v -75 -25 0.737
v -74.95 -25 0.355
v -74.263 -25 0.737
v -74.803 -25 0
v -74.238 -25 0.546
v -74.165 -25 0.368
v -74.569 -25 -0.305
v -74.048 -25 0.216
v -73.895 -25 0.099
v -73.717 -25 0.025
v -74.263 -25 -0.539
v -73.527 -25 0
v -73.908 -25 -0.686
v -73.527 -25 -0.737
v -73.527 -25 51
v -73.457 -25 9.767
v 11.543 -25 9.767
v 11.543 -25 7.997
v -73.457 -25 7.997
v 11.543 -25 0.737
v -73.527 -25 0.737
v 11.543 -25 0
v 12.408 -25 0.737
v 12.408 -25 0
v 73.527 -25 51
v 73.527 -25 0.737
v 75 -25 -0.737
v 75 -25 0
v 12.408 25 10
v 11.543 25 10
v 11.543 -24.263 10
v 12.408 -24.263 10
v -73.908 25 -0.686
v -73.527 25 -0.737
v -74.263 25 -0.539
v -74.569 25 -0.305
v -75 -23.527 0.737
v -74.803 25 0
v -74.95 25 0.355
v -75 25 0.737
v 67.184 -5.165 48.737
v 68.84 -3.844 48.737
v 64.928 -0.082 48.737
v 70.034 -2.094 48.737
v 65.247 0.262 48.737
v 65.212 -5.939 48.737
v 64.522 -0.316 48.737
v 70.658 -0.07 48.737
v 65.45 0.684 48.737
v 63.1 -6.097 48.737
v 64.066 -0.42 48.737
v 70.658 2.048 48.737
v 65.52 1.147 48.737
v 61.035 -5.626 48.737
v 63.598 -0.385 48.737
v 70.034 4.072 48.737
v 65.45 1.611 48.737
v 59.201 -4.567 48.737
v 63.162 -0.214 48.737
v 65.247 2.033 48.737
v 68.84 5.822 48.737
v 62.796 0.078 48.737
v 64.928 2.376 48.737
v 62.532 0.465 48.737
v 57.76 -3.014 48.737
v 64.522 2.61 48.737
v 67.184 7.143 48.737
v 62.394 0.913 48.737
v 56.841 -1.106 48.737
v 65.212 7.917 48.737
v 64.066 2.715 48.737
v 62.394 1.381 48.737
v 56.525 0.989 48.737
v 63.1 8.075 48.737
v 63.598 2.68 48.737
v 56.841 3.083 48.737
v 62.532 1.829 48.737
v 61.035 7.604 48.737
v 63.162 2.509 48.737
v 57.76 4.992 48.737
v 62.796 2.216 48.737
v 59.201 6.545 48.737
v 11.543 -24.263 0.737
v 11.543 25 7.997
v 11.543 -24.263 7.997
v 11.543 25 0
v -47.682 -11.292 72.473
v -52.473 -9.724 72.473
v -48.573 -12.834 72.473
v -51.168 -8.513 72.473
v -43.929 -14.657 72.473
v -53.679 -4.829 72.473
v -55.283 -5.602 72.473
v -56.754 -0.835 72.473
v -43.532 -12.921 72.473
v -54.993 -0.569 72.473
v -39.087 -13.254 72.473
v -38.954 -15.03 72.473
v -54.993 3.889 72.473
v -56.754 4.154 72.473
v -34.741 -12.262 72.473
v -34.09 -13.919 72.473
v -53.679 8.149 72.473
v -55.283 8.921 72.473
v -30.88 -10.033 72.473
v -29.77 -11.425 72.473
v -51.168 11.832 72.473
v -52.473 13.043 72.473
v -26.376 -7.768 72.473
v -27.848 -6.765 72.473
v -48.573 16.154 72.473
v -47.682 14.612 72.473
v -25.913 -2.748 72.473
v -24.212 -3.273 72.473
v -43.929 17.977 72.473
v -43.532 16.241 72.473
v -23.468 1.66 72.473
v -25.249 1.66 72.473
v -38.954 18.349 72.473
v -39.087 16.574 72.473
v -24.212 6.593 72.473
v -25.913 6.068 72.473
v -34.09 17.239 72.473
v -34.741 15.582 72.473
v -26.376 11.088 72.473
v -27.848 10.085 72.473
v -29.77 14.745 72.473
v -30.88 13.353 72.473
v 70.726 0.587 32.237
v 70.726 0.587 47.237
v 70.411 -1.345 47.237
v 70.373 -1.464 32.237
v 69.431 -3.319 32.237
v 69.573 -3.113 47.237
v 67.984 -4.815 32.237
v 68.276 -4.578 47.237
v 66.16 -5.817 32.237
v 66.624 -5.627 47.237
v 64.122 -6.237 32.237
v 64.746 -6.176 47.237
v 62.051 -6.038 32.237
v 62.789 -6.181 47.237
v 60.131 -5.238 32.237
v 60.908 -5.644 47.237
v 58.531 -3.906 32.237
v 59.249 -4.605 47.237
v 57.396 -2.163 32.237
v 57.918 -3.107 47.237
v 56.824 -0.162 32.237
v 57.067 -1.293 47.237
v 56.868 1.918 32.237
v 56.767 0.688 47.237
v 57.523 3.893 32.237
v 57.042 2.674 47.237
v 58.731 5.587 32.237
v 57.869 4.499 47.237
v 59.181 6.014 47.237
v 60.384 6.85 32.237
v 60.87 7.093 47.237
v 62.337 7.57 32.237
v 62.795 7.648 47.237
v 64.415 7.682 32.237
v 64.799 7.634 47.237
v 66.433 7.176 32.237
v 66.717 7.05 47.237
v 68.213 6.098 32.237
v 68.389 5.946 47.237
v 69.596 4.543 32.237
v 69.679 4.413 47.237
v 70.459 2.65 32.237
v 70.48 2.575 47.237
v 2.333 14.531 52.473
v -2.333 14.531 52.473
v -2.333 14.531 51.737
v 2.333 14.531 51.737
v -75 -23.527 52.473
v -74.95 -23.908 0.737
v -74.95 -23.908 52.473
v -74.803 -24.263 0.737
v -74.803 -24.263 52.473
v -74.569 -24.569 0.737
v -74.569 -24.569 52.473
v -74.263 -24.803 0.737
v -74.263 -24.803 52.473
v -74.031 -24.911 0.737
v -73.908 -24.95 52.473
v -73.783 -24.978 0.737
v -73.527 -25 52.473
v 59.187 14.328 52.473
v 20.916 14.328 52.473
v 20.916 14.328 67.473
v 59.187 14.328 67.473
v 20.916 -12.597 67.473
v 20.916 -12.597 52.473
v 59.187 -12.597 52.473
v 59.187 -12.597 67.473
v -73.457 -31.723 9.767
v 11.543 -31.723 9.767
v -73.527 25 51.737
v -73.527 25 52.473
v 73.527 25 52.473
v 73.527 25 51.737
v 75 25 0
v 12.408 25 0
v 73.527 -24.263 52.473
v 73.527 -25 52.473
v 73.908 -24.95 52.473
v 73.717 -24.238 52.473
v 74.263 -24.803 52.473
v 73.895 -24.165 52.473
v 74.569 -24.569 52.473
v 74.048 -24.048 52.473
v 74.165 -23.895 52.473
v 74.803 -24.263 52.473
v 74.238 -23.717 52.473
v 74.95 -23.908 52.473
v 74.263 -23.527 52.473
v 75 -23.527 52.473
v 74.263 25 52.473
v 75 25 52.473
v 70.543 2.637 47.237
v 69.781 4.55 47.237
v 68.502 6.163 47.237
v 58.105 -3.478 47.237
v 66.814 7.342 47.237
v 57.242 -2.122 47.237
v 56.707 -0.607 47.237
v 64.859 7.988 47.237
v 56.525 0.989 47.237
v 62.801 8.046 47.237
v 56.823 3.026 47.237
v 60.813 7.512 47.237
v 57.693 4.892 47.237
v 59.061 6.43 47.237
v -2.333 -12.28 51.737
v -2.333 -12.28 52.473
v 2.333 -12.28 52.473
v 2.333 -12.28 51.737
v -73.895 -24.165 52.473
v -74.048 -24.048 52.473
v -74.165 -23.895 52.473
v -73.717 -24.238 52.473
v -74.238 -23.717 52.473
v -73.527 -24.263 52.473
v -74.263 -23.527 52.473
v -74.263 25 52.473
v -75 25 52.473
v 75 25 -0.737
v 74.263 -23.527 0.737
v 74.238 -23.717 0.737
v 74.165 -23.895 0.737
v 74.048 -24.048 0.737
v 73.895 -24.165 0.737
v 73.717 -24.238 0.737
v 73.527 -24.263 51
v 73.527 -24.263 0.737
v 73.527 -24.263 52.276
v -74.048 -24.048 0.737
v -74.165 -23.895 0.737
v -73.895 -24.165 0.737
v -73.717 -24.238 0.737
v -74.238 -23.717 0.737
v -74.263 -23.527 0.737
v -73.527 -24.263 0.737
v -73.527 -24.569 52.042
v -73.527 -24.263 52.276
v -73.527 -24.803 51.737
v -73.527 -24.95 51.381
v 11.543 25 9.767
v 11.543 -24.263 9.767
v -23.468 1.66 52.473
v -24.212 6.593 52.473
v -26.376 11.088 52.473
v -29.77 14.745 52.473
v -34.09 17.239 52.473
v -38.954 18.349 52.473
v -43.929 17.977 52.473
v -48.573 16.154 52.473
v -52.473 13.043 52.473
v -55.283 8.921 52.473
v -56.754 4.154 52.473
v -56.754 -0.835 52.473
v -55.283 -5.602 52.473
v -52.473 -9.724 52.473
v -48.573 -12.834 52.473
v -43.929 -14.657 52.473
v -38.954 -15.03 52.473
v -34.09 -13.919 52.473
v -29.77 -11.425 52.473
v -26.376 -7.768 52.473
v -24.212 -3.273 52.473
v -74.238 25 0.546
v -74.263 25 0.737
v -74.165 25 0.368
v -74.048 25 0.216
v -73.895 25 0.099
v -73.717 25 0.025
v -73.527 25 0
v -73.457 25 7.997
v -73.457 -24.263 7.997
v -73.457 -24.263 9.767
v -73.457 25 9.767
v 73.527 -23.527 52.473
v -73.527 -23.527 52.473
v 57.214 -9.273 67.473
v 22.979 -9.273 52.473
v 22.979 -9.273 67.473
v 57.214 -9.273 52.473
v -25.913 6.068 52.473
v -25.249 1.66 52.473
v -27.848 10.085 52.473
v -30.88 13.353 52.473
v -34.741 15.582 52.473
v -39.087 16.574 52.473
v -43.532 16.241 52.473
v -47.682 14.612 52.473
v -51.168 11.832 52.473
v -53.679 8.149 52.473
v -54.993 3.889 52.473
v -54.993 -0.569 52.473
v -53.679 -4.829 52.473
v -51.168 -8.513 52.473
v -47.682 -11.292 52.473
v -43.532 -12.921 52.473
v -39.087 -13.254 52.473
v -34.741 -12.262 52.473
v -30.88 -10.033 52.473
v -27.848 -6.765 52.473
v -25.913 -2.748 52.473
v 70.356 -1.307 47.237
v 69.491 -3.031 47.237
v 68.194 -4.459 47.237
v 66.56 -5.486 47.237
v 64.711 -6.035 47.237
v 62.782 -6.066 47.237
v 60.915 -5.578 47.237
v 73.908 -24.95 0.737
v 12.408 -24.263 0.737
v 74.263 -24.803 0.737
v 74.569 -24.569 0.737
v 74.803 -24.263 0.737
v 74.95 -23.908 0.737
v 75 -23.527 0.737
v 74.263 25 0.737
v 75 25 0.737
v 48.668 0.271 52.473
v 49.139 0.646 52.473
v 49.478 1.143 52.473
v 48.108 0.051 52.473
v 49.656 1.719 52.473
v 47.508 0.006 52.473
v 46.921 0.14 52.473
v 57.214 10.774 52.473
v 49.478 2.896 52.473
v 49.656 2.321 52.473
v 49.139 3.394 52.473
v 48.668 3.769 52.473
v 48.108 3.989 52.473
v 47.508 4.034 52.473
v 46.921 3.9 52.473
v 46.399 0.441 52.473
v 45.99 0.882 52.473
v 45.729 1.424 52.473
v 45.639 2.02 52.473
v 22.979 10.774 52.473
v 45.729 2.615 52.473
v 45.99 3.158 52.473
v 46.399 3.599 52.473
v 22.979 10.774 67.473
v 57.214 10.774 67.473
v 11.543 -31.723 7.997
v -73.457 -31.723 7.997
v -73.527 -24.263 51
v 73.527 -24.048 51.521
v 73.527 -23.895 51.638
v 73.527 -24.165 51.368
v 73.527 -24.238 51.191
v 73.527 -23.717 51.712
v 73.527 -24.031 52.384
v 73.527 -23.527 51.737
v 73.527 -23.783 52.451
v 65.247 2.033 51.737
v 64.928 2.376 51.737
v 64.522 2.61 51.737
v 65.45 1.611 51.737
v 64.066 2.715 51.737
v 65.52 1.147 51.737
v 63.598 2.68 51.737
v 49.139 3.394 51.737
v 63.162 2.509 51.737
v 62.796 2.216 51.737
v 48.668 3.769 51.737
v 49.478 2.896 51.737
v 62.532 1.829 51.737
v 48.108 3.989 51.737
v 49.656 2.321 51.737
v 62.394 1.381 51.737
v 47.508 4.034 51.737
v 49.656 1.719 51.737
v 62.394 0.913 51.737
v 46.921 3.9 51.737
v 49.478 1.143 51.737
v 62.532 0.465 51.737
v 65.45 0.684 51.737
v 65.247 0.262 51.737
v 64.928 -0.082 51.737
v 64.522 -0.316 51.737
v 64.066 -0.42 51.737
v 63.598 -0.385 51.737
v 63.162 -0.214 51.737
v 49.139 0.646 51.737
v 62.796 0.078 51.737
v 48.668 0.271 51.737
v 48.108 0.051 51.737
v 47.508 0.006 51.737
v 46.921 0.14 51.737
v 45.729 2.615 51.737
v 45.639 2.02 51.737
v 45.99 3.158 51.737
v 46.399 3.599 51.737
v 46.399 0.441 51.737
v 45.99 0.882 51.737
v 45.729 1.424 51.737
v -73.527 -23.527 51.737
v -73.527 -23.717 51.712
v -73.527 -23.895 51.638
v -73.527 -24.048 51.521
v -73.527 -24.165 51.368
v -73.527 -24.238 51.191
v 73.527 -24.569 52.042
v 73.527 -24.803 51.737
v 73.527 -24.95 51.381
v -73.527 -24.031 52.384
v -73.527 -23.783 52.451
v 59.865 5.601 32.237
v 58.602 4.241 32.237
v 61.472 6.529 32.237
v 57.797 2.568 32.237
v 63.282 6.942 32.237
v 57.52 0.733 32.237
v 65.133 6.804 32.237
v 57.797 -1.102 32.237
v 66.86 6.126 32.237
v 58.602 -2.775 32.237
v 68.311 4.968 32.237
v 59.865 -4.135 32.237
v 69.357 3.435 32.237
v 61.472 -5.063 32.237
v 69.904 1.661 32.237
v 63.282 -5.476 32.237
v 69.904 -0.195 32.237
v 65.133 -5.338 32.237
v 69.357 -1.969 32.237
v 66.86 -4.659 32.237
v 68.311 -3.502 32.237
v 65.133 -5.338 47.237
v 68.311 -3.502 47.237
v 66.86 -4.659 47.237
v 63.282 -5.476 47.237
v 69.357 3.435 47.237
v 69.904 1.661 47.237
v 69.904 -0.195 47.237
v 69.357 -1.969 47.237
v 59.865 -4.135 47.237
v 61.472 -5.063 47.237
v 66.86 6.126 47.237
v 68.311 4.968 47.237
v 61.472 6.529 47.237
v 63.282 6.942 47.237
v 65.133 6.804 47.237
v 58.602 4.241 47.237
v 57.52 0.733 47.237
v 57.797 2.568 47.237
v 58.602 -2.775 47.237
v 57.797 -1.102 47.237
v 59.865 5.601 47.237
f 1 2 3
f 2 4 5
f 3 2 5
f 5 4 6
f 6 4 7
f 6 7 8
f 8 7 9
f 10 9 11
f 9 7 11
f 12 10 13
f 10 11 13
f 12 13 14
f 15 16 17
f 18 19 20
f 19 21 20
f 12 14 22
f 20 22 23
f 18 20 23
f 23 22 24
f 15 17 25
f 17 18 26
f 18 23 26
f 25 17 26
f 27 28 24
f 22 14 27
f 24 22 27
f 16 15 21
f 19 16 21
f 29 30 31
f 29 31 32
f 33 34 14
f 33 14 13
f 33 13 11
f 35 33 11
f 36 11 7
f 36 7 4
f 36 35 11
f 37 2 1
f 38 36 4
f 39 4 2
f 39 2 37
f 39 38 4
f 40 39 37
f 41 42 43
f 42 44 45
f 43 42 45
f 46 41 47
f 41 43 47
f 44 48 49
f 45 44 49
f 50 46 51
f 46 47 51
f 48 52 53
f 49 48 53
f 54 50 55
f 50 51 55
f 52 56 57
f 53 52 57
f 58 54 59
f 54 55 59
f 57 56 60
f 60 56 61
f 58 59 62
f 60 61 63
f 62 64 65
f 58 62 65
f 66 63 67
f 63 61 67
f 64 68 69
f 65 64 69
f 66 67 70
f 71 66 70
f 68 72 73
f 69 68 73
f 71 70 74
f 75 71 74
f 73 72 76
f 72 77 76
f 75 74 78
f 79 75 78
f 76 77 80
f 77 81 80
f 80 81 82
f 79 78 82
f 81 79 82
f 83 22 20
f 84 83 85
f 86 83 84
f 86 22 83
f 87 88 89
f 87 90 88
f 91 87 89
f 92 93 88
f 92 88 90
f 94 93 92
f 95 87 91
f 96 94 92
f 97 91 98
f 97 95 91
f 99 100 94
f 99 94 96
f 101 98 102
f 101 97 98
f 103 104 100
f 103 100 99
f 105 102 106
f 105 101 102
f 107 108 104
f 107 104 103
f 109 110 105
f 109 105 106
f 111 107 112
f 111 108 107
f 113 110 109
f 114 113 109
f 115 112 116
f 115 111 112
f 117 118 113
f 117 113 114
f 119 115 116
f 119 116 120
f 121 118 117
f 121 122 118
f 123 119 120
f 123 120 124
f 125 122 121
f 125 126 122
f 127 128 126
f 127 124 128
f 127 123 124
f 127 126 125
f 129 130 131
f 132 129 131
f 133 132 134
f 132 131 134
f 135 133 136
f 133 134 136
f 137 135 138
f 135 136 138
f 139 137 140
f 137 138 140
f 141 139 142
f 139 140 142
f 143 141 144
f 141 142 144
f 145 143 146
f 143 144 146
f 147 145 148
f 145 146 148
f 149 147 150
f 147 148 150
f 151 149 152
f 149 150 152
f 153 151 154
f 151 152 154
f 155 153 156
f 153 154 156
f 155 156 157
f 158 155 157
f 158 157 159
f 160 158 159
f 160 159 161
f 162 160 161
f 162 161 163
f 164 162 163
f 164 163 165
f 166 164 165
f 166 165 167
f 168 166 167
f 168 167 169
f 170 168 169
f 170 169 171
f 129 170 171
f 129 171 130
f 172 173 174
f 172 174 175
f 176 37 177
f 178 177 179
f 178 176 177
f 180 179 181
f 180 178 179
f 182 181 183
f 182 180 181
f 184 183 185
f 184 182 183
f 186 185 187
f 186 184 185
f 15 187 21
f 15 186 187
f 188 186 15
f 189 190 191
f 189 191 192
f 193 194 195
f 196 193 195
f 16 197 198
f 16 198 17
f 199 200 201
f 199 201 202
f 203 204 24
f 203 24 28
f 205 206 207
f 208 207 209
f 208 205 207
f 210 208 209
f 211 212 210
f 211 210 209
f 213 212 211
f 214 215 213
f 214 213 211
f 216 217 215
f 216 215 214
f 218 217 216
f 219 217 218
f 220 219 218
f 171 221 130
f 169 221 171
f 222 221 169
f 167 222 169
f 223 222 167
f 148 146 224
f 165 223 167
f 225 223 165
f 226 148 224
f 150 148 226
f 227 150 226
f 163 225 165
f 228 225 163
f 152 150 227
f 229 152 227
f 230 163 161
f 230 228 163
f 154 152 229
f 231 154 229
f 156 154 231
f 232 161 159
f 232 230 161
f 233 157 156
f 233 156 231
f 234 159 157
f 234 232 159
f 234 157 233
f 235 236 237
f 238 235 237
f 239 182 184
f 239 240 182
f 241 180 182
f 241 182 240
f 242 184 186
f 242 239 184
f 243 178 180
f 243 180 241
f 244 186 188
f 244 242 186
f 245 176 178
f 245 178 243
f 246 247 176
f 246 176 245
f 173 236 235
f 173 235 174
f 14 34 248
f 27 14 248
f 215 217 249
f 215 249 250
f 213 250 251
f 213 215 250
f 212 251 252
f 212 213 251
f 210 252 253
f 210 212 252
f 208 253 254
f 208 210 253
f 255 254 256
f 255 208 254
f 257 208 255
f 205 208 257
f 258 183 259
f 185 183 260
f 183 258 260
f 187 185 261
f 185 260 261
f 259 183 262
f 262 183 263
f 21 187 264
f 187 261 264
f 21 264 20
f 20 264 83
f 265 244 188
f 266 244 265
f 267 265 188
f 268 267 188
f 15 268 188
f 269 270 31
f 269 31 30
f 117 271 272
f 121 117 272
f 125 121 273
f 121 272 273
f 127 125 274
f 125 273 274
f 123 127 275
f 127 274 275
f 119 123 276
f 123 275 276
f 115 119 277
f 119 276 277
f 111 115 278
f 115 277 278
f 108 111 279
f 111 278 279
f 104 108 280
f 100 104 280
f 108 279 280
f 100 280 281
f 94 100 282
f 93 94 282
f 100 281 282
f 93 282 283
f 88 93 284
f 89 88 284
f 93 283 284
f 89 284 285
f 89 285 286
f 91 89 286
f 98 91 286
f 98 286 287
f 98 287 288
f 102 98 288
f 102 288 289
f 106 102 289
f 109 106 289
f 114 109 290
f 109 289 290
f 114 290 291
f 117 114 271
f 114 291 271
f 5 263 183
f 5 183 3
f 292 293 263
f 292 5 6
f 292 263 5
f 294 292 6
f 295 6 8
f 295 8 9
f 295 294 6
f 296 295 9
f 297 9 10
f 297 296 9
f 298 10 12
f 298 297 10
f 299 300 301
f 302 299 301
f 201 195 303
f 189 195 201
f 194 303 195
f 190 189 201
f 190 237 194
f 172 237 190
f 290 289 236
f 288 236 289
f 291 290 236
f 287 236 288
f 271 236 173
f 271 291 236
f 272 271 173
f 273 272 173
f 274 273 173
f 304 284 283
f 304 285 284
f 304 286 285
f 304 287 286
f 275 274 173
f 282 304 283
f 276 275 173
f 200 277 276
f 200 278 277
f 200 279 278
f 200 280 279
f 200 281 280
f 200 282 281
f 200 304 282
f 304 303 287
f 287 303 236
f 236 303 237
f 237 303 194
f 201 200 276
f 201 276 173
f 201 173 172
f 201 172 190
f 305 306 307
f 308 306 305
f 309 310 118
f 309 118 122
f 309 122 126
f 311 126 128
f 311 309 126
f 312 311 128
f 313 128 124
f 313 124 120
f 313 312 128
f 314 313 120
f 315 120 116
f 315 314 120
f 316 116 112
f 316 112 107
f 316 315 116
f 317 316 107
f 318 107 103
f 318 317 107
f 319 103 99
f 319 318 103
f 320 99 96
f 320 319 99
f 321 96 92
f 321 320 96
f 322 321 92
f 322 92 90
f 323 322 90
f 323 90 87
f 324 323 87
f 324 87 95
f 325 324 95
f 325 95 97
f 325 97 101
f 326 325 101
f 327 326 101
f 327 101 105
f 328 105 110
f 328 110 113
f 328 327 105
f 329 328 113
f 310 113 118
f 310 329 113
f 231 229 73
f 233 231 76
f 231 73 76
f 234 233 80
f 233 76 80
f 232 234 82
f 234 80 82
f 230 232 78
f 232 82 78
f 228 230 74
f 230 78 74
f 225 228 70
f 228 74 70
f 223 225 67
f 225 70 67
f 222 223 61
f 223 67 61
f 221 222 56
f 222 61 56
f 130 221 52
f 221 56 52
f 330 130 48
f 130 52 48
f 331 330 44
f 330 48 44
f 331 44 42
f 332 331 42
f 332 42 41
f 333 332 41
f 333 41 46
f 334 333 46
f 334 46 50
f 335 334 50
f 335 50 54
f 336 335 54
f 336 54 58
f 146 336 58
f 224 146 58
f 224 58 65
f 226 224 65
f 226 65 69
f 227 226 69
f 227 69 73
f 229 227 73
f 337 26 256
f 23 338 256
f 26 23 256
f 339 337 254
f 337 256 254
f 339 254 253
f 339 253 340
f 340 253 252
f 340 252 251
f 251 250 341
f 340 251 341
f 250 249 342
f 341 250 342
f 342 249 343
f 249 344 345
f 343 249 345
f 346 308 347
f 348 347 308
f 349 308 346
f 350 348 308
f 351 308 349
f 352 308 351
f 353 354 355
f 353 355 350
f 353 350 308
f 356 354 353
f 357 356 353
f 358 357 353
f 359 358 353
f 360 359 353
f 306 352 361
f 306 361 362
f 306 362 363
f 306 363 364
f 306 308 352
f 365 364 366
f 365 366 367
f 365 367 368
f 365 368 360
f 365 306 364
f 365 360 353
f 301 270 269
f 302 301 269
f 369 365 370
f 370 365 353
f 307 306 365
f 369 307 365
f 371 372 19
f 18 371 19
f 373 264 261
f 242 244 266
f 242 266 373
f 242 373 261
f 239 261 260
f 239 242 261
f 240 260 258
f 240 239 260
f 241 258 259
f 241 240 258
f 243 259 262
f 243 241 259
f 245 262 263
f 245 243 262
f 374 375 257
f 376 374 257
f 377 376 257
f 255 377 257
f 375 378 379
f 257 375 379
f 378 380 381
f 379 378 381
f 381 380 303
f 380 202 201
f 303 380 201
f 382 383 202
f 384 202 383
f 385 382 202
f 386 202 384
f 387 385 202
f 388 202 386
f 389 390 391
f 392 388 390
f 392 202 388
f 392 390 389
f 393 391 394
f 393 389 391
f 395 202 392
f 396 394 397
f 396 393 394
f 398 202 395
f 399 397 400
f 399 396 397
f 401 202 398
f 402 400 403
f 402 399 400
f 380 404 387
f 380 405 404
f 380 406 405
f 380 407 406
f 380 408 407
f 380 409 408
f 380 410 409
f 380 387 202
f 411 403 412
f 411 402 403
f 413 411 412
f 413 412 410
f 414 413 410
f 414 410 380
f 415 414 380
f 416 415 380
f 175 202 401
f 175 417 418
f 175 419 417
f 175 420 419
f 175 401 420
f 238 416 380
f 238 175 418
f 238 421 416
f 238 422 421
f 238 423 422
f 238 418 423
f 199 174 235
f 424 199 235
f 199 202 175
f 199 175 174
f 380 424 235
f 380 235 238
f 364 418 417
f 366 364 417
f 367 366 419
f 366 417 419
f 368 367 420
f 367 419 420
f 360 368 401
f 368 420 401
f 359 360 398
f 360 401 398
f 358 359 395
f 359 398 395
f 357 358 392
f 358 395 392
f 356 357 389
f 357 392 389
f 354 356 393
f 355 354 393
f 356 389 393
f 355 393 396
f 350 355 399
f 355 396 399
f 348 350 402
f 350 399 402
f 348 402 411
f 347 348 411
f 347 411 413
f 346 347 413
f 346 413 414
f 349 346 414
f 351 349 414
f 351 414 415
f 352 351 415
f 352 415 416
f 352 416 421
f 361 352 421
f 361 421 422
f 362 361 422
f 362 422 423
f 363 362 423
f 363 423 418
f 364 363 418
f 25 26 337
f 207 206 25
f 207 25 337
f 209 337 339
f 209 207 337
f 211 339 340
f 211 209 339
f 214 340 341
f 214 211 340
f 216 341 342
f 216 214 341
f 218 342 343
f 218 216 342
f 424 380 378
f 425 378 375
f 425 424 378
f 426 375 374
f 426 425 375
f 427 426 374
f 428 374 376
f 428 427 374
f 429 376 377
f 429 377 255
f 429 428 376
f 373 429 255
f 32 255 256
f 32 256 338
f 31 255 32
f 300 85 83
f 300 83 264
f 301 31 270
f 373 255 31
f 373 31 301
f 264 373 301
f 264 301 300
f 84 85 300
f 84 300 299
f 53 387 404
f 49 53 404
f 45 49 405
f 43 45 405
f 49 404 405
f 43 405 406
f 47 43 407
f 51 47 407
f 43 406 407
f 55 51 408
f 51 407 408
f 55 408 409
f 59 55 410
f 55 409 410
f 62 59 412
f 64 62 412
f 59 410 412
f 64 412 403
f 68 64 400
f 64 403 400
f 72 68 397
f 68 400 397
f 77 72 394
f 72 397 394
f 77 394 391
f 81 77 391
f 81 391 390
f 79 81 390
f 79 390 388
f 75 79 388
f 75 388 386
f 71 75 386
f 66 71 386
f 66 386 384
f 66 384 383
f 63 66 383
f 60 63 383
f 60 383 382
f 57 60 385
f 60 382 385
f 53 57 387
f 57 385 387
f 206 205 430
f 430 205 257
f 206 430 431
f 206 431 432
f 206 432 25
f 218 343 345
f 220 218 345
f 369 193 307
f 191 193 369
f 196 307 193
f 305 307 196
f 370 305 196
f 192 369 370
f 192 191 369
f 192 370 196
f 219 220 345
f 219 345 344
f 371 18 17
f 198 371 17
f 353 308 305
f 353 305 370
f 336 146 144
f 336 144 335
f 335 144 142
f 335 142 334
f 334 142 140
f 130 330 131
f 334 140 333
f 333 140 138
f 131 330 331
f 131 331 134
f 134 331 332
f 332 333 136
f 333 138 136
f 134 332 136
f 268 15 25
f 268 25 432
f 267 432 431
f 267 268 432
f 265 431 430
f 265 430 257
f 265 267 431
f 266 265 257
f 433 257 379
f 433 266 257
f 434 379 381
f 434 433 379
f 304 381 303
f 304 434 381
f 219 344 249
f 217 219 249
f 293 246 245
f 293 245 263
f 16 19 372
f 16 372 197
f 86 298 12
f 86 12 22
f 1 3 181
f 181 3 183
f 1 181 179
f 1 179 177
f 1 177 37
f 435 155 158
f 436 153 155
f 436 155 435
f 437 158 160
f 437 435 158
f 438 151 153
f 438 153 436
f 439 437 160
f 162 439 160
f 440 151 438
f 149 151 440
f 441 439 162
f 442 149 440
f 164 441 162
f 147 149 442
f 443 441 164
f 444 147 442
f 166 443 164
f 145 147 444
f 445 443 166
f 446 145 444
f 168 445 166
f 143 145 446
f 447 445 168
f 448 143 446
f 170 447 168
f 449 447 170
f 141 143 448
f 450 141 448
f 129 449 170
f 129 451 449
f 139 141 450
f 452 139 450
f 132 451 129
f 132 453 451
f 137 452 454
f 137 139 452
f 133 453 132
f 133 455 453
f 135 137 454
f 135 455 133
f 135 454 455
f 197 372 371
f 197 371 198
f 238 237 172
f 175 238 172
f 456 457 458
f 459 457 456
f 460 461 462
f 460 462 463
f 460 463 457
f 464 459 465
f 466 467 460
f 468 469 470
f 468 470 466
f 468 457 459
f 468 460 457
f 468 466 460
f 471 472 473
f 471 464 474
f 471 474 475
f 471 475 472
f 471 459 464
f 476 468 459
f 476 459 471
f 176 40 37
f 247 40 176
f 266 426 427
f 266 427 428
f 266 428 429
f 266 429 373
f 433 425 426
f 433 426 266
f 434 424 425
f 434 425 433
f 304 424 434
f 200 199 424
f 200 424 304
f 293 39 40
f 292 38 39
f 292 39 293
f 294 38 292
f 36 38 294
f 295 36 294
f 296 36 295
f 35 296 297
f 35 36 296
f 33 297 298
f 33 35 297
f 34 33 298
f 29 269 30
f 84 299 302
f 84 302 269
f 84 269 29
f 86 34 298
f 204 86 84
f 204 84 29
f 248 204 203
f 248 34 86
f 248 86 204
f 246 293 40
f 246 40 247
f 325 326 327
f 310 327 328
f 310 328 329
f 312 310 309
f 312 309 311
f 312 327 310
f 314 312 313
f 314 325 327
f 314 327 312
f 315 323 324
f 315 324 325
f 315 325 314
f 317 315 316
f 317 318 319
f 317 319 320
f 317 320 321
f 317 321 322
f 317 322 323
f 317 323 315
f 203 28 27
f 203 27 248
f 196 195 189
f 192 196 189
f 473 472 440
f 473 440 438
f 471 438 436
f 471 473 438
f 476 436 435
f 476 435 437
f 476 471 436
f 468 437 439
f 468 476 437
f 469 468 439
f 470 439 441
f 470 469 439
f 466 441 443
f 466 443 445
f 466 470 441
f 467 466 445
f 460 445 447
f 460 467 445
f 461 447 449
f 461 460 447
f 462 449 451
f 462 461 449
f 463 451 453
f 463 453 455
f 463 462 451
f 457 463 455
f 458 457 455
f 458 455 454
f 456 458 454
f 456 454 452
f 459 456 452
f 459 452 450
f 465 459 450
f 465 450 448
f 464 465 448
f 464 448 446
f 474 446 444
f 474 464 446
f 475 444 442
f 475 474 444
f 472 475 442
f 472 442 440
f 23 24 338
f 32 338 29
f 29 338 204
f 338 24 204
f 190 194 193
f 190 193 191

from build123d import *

# Parameters (mm, degrees)
SKETCH1_W                    = 150
SKETCH1_H                    = 50
BASE_FLANGE1_DEPTH           = 0.7366
EDGE_FLANGE2_STRIP_W         = 4.4196
EDGE_FLANGE2_STRIP_H         = 0.7366
EDGE_FLANGE2_STRIP_CUT_DEPTH = 50
EDGE_FLANGE2_DEPTH           = 50
EDGE_FLANGE3_STRIP_W         = 4.4196
EDGE_FLANGE3_STRIP_H         = 0.7366
EDGE_FLANGE3_STRIP_CUT_DEPTH = 51.7366
EDGE_FLANGE3_DEPTH           = 51.7366
EDGE_FLANGE5_STRIP_W         = 4.4196
EDGE_FLANGE5_STRIP_H         = 0.7366
EDGE_FLANGE5_STRIP_CUT_DEPTH = 51.7366
EDGE_FLANGE5_DEPTH           = 51.7366
EDGE_FLANGE6_STRIP_W         = 4.4196
EDGE_FLANGE6_STRIP_H         = 0.7366
EDGE_FLANGE6_STRIP_CUT_DEPTH = 147.0536
EDGE_FLANGE6_DEPTH           = 147.0536
SKETCH38_W                   = 4.66509895
SKETCH38_H                   = 26.811141958
CUT_EXTRUDE1_DEPTH           = 2
SKETCH40_R                   = 16.736303479
SKETCH40_R_2                 = 14.955594907
BOSS_EXTRUDE4_DEPTH          = 20
SKETCH42_W                   = 0.865074657
SKETCH42_H                   = 50
BOSS_EXTRUDE5_DEPTH          = 10
SKETCH57_W                   = 1.770321067
SKETCH57_H                   = 56.722896859
BOSS_EXTRUDE7_DEPTH          = 85
SKETCH60_W                   = 38.271407539
SKETCH60_H                   = 26.924897386
SKETCH60_W_2                 = 34.235775553
SKETCH60_H_2                 = 20.047107357
BOSS_EXTRUDE8_DEPTH          = 15
SKETCH61_R                   = 2.019782533
CUT_EXTRUDE3_DEPTH           = 2
SKETCH62_R                   = 1.571954748
BOSS_EXTRUDE9_DEPTH          = 3
SKETCH63_R                   = 7.10603058
BOSS_EXTRUDE10_DEPTH         = 1.5
SKETCH64_R                   = 6.980489156
SKETCH64_R_2                 = 6.226740222
BOSS_EXTRUDE11_DEPTH         = 15


# Sheet-metal steps are written as plain solids
with BuildPart() as part:
    # Sketch1 → Base-Flange1 (new body)
    with BuildSketch(Plane.XY):
        Rectangle(SKETCH1_W, SKETCH1_H)
    extrude(amount=-BASE_FLANGE1_DEPTH)

    # Edge-Flange2 strip (across the edge) → Edge-Flange2 strip cut (cut)
    with BuildSketch(Plane(origin=(-75, 25, 0), x_dir=(1, 0, 0), z_dir=(0, -1, 0))):
        with Locations((-0.7366, -0.3683)):
            Rectangle(EDGE_FLANGE2_STRIP_W, EDGE_FLANGE2_STRIP_H)
    extrude(amount=EDGE_FLANGE2_STRIP_CUT_DEPTH, mode=Mode.SUBTRACT)

    # Edge-Flange2 section (across the edge) → Edge-Flange2 (add)
    with BuildSketch(Plane(origin=(-75, 25, 0), x_dir=(1, 0, 0), z_dir=(0, -1, 0))):
        with BuildLine():
            Line((0, 0.7366), (0, 52.4732))
            Line((0, 52.4732), (0.7366, 52.4732))
            Line((0.7366, 52.4732), (0.7366, 0.7366))
            ThreePointArc((0.7366, 0.7366), (0.952345145, 0.215745145), (1.4732, 0))
            Line((1.4732, 0), (1.4732, -0.7366))
            ThreePointArc((1.4732, -0.7366), (0.43149029, -0.30510971), (0, 0.7366))
        make_face()
    extrude(amount=EDGE_FLANGE2_DEPTH)

    # Edge-Flange3 strip (across the edge) → Edge-Flange3 strip cut (cut)
    with BuildSketch(Plane(origin=(-74.2634, -25, 52.4732), x_dir=(0, 1, 0), z_dir=(0, 0, -1))):
        with Locations((-0.7366, -0.3683)):
            Rectangle(EDGE_FLANGE3_STRIP_W, EDGE_FLANGE3_STRIP_H)
    extrude(amount=EDGE_FLANGE3_STRIP_CUT_DEPTH, mode=Mode.SUBTRACT)

    # Edge-Flange3 section (across the edge) → Edge-Flange3 (add)
    with BuildSketch(Plane(origin=(-74.2634, -25, 52.4732), x_dir=(0, 1, 0), z_dir=(0, 0, -1))):
        with BuildLine():
            Line((0, 0.7366), (0, 149.2634))
            Line((0, 149.2634), (0.7366, 149.2634))
            Line((0.7366, 149.2634), (0.7366, 0.7366))
            ThreePointArc((0.7366, 0.7366), (0.952345145, 0.215745145), (1.4732, 0))
            Line((1.4732, 0), (1.4732, -0.7366))
            ThreePointArc((1.4732, -0.7366), (0.43149029, -0.30510971), (0, 0.7366))
        make_face()
    extrude(amount=EDGE_FLANGE3_DEPTH)

    # Edge-Flange5 strip (across the edge) → Edge-Flange5 strip cut (cut)
    with BuildSketch(Plane(origin=(75, -24.2634, 52.4732), x_dir=(-1, 0, 0), z_dir=(0, 0, -1))):
        with Locations((-0.7366, -0.3683)):
            Rectangle(EDGE_FLANGE5_STRIP_W, EDGE_FLANGE5_STRIP_H)
    extrude(amount=EDGE_FLANGE5_STRIP_CUT_DEPTH, mode=Mode.SUBTRACT)

    # Edge-Flange5 section (across the edge) → Edge-Flange5 (add)
    with BuildSketch(Plane(origin=(75, -24.2634, 52.4732), x_dir=(-1, 0, 0), z_dir=(0, 0, -1))):
        with BuildLine():
            Line((0, 0.7366), (0, 49.2634))
            Line((0, 49.2634), (0.7366, 49.2634))
            Line((0.7366, 49.2634), (0.7366, 0.7366))
            ThreePointArc((0.7366, 0.7366), (0.952345145, 0.215745145), (1.4732, 0))
            Line((1.4732, 0), (1.4732, -0.7366))
            ThreePointArc((1.4732, -0.7366), (0.43149029, -0.30510971), (0, 0.7366))
        make_face()
    extrude(amount=EDGE_FLANGE5_DEPTH)

    # Edge-Flange6 strip (across the edge) → Edge-Flange6 strip cut (cut)
    with BuildSketch(Plane(origin=(-73.5268, -24.2634, 52.4732), x_dir=(0, 0, -1), z_dir=(1, 0, 0))):
        with Locations((-0.7366, -0.3683)):
            Rectangle(EDGE_FLANGE6_STRIP_W, EDGE_FLANGE6_STRIP_H)
    extrude(amount=EDGE_FLANGE6_STRIP_CUT_DEPTH, mode=Mode.SUBTRACT)

    # Edge-Flange6 section (across the edge) → Edge-Flange6 (add)
    with BuildSketch(Plane(origin=(-73.5268, -24.2634, 52.4732), x_dir=(0, 0, -1), z_dir=(1, 0, 0))):
        with BuildLine():
            Line((0, 0.7366), (0, 49.2634))
            Line((0, 49.2634), (0.7366, 49.2634))
            Line((0.7366, 49.2634), (0.7366, 0.7366))
            ThreePointArc((0.7366, 0.7366), (0.952345145, 0.215745145), (1.4732, 0))
            Line((1.4732, 0), (1.4732, -0.7366))
            ThreePointArc((1.4732, -0.7366), (0.43149029, -0.30510971), (0, 0.7366))
        make_face()
    extrude(amount=EDGE_FLANGE6_DEPTH)

    # Sketch38 → Cut-Extrude1 (cut)
    with BuildSketch(Plane.XY.offset(52.4732)):
        with Locations((0, 1.125354672)):
            Rectangle(SKETCH38_W, SKETCH38_H)
    extrude(amount=-CUT_EXTRUDE1_DEPTH, mode=Mode.SUBTRACT)

    # Sketch40 → Boss-Extrude4 (add)
    with BuildSketch(Plane.XY.offset(52.4732)):
        with Locations((-40.204479975, 1.659887055)):
            Circle(SKETCH40_R)
        with Locations((-40.204479975, 1.659887055)):
            Circle(SKETCH40_R_2, mode=Mode.SUBTRACT)
    extrude(amount=BOSS_EXTRUDE4_DEPTH)

    # Sketch42 → Boss-Extrude5 (add)
    with BuildSketch(Plane.XY):
        with Locations((11.975597677, 0)):
            Rectangle(SKETCH42_W, SKETCH42_H)
    extrude(amount=BOSS_EXTRUDE5_DEPTH)

    # Sketch57 → Boss-Extrude7 (add)
    with BuildSketch(Plane.ZY.offset(-11.543060348)):
        with Locations((8.882085538, -3.36144843)):
            Rectangle(SKETCH57_W, SKETCH57_H)
    extrude(amount=BOSS_EXTRUDE7_DEPTH)

    # Sketch60 → Boss-Extrude8 (add)
    with BuildSketch(Plane.XY.offset(52.4732)):
        with Locations((40.051357612, 0.865314599)):
            Rectangle(SKETCH60_W, SKETCH60_H)
        with Locations((40.096607613, 0.750841138)):
            Rectangle(SKETCH60_W_2, SKETCH60_H_2, mode=Mode.SUBTRACT)
    extrude(amount=BOSS_EXTRUDE8_DEPTH)

    # Sketch61 → Cut-Extrude3 (cut)
    with BuildSketch(Plane(origin=(0, 0, 51.7366), x_dir=(-1, 0, 0), z_dir=(0, 0, -1))):
        with Locations((-47.658560575, 2.019782533)):
            Circle(SKETCH61_R)
    extrude(amount=-CUT_EXTRUDE3_DEPTH, mode=Mode.SUBTRACT)

    # Sketch62 → Boss-Extrude9 (add)
    with BuildSketch(Plane(origin=(0, 0, 51.7366), x_dir=(-1, 0, 0), z_dir=(0, 0, -1))):
        with Locations(Location((-63.948086172, 1.147200329, 0), (0, 0, 180))):
            Circle(SKETCH62_R)
    extrude(amount=BOSS_EXTRUDE9_DEPTH)

    # Sketch63 → Boss-Extrude10 (add)
    with BuildSketch(Plane(origin=(0, 0, 48.7366), x_dir=(-1, 0, 0), z_dir=(0, 0, -1))):
        with Locations((-63.631248371, 0.988840217)):
            Circle(SKETCH63_R)
    extrude(amount=BOSS_EXTRUDE10_DEPTH)

    # Sketch64 → Boss-Extrude11 (add)
    with BuildSketch(Plane(origin=(0, 0, 47.2366), x_dir=(-1, 0, 0), z_dir=(0, 0, -1))):
        with Locations(Location((-63.746933468, 0.733116553, 0), (0, 0, 181.202812621))):
            Circle(SKETCH64_R)
        with Locations((-63.746933468, 0.733116553)):
            Circle(SKETCH64_R_2, mode=Mode.SUBTRACT)
    extrude(amount=BOSS_EXTRUDE11_DEPTH)


solid = part.part
